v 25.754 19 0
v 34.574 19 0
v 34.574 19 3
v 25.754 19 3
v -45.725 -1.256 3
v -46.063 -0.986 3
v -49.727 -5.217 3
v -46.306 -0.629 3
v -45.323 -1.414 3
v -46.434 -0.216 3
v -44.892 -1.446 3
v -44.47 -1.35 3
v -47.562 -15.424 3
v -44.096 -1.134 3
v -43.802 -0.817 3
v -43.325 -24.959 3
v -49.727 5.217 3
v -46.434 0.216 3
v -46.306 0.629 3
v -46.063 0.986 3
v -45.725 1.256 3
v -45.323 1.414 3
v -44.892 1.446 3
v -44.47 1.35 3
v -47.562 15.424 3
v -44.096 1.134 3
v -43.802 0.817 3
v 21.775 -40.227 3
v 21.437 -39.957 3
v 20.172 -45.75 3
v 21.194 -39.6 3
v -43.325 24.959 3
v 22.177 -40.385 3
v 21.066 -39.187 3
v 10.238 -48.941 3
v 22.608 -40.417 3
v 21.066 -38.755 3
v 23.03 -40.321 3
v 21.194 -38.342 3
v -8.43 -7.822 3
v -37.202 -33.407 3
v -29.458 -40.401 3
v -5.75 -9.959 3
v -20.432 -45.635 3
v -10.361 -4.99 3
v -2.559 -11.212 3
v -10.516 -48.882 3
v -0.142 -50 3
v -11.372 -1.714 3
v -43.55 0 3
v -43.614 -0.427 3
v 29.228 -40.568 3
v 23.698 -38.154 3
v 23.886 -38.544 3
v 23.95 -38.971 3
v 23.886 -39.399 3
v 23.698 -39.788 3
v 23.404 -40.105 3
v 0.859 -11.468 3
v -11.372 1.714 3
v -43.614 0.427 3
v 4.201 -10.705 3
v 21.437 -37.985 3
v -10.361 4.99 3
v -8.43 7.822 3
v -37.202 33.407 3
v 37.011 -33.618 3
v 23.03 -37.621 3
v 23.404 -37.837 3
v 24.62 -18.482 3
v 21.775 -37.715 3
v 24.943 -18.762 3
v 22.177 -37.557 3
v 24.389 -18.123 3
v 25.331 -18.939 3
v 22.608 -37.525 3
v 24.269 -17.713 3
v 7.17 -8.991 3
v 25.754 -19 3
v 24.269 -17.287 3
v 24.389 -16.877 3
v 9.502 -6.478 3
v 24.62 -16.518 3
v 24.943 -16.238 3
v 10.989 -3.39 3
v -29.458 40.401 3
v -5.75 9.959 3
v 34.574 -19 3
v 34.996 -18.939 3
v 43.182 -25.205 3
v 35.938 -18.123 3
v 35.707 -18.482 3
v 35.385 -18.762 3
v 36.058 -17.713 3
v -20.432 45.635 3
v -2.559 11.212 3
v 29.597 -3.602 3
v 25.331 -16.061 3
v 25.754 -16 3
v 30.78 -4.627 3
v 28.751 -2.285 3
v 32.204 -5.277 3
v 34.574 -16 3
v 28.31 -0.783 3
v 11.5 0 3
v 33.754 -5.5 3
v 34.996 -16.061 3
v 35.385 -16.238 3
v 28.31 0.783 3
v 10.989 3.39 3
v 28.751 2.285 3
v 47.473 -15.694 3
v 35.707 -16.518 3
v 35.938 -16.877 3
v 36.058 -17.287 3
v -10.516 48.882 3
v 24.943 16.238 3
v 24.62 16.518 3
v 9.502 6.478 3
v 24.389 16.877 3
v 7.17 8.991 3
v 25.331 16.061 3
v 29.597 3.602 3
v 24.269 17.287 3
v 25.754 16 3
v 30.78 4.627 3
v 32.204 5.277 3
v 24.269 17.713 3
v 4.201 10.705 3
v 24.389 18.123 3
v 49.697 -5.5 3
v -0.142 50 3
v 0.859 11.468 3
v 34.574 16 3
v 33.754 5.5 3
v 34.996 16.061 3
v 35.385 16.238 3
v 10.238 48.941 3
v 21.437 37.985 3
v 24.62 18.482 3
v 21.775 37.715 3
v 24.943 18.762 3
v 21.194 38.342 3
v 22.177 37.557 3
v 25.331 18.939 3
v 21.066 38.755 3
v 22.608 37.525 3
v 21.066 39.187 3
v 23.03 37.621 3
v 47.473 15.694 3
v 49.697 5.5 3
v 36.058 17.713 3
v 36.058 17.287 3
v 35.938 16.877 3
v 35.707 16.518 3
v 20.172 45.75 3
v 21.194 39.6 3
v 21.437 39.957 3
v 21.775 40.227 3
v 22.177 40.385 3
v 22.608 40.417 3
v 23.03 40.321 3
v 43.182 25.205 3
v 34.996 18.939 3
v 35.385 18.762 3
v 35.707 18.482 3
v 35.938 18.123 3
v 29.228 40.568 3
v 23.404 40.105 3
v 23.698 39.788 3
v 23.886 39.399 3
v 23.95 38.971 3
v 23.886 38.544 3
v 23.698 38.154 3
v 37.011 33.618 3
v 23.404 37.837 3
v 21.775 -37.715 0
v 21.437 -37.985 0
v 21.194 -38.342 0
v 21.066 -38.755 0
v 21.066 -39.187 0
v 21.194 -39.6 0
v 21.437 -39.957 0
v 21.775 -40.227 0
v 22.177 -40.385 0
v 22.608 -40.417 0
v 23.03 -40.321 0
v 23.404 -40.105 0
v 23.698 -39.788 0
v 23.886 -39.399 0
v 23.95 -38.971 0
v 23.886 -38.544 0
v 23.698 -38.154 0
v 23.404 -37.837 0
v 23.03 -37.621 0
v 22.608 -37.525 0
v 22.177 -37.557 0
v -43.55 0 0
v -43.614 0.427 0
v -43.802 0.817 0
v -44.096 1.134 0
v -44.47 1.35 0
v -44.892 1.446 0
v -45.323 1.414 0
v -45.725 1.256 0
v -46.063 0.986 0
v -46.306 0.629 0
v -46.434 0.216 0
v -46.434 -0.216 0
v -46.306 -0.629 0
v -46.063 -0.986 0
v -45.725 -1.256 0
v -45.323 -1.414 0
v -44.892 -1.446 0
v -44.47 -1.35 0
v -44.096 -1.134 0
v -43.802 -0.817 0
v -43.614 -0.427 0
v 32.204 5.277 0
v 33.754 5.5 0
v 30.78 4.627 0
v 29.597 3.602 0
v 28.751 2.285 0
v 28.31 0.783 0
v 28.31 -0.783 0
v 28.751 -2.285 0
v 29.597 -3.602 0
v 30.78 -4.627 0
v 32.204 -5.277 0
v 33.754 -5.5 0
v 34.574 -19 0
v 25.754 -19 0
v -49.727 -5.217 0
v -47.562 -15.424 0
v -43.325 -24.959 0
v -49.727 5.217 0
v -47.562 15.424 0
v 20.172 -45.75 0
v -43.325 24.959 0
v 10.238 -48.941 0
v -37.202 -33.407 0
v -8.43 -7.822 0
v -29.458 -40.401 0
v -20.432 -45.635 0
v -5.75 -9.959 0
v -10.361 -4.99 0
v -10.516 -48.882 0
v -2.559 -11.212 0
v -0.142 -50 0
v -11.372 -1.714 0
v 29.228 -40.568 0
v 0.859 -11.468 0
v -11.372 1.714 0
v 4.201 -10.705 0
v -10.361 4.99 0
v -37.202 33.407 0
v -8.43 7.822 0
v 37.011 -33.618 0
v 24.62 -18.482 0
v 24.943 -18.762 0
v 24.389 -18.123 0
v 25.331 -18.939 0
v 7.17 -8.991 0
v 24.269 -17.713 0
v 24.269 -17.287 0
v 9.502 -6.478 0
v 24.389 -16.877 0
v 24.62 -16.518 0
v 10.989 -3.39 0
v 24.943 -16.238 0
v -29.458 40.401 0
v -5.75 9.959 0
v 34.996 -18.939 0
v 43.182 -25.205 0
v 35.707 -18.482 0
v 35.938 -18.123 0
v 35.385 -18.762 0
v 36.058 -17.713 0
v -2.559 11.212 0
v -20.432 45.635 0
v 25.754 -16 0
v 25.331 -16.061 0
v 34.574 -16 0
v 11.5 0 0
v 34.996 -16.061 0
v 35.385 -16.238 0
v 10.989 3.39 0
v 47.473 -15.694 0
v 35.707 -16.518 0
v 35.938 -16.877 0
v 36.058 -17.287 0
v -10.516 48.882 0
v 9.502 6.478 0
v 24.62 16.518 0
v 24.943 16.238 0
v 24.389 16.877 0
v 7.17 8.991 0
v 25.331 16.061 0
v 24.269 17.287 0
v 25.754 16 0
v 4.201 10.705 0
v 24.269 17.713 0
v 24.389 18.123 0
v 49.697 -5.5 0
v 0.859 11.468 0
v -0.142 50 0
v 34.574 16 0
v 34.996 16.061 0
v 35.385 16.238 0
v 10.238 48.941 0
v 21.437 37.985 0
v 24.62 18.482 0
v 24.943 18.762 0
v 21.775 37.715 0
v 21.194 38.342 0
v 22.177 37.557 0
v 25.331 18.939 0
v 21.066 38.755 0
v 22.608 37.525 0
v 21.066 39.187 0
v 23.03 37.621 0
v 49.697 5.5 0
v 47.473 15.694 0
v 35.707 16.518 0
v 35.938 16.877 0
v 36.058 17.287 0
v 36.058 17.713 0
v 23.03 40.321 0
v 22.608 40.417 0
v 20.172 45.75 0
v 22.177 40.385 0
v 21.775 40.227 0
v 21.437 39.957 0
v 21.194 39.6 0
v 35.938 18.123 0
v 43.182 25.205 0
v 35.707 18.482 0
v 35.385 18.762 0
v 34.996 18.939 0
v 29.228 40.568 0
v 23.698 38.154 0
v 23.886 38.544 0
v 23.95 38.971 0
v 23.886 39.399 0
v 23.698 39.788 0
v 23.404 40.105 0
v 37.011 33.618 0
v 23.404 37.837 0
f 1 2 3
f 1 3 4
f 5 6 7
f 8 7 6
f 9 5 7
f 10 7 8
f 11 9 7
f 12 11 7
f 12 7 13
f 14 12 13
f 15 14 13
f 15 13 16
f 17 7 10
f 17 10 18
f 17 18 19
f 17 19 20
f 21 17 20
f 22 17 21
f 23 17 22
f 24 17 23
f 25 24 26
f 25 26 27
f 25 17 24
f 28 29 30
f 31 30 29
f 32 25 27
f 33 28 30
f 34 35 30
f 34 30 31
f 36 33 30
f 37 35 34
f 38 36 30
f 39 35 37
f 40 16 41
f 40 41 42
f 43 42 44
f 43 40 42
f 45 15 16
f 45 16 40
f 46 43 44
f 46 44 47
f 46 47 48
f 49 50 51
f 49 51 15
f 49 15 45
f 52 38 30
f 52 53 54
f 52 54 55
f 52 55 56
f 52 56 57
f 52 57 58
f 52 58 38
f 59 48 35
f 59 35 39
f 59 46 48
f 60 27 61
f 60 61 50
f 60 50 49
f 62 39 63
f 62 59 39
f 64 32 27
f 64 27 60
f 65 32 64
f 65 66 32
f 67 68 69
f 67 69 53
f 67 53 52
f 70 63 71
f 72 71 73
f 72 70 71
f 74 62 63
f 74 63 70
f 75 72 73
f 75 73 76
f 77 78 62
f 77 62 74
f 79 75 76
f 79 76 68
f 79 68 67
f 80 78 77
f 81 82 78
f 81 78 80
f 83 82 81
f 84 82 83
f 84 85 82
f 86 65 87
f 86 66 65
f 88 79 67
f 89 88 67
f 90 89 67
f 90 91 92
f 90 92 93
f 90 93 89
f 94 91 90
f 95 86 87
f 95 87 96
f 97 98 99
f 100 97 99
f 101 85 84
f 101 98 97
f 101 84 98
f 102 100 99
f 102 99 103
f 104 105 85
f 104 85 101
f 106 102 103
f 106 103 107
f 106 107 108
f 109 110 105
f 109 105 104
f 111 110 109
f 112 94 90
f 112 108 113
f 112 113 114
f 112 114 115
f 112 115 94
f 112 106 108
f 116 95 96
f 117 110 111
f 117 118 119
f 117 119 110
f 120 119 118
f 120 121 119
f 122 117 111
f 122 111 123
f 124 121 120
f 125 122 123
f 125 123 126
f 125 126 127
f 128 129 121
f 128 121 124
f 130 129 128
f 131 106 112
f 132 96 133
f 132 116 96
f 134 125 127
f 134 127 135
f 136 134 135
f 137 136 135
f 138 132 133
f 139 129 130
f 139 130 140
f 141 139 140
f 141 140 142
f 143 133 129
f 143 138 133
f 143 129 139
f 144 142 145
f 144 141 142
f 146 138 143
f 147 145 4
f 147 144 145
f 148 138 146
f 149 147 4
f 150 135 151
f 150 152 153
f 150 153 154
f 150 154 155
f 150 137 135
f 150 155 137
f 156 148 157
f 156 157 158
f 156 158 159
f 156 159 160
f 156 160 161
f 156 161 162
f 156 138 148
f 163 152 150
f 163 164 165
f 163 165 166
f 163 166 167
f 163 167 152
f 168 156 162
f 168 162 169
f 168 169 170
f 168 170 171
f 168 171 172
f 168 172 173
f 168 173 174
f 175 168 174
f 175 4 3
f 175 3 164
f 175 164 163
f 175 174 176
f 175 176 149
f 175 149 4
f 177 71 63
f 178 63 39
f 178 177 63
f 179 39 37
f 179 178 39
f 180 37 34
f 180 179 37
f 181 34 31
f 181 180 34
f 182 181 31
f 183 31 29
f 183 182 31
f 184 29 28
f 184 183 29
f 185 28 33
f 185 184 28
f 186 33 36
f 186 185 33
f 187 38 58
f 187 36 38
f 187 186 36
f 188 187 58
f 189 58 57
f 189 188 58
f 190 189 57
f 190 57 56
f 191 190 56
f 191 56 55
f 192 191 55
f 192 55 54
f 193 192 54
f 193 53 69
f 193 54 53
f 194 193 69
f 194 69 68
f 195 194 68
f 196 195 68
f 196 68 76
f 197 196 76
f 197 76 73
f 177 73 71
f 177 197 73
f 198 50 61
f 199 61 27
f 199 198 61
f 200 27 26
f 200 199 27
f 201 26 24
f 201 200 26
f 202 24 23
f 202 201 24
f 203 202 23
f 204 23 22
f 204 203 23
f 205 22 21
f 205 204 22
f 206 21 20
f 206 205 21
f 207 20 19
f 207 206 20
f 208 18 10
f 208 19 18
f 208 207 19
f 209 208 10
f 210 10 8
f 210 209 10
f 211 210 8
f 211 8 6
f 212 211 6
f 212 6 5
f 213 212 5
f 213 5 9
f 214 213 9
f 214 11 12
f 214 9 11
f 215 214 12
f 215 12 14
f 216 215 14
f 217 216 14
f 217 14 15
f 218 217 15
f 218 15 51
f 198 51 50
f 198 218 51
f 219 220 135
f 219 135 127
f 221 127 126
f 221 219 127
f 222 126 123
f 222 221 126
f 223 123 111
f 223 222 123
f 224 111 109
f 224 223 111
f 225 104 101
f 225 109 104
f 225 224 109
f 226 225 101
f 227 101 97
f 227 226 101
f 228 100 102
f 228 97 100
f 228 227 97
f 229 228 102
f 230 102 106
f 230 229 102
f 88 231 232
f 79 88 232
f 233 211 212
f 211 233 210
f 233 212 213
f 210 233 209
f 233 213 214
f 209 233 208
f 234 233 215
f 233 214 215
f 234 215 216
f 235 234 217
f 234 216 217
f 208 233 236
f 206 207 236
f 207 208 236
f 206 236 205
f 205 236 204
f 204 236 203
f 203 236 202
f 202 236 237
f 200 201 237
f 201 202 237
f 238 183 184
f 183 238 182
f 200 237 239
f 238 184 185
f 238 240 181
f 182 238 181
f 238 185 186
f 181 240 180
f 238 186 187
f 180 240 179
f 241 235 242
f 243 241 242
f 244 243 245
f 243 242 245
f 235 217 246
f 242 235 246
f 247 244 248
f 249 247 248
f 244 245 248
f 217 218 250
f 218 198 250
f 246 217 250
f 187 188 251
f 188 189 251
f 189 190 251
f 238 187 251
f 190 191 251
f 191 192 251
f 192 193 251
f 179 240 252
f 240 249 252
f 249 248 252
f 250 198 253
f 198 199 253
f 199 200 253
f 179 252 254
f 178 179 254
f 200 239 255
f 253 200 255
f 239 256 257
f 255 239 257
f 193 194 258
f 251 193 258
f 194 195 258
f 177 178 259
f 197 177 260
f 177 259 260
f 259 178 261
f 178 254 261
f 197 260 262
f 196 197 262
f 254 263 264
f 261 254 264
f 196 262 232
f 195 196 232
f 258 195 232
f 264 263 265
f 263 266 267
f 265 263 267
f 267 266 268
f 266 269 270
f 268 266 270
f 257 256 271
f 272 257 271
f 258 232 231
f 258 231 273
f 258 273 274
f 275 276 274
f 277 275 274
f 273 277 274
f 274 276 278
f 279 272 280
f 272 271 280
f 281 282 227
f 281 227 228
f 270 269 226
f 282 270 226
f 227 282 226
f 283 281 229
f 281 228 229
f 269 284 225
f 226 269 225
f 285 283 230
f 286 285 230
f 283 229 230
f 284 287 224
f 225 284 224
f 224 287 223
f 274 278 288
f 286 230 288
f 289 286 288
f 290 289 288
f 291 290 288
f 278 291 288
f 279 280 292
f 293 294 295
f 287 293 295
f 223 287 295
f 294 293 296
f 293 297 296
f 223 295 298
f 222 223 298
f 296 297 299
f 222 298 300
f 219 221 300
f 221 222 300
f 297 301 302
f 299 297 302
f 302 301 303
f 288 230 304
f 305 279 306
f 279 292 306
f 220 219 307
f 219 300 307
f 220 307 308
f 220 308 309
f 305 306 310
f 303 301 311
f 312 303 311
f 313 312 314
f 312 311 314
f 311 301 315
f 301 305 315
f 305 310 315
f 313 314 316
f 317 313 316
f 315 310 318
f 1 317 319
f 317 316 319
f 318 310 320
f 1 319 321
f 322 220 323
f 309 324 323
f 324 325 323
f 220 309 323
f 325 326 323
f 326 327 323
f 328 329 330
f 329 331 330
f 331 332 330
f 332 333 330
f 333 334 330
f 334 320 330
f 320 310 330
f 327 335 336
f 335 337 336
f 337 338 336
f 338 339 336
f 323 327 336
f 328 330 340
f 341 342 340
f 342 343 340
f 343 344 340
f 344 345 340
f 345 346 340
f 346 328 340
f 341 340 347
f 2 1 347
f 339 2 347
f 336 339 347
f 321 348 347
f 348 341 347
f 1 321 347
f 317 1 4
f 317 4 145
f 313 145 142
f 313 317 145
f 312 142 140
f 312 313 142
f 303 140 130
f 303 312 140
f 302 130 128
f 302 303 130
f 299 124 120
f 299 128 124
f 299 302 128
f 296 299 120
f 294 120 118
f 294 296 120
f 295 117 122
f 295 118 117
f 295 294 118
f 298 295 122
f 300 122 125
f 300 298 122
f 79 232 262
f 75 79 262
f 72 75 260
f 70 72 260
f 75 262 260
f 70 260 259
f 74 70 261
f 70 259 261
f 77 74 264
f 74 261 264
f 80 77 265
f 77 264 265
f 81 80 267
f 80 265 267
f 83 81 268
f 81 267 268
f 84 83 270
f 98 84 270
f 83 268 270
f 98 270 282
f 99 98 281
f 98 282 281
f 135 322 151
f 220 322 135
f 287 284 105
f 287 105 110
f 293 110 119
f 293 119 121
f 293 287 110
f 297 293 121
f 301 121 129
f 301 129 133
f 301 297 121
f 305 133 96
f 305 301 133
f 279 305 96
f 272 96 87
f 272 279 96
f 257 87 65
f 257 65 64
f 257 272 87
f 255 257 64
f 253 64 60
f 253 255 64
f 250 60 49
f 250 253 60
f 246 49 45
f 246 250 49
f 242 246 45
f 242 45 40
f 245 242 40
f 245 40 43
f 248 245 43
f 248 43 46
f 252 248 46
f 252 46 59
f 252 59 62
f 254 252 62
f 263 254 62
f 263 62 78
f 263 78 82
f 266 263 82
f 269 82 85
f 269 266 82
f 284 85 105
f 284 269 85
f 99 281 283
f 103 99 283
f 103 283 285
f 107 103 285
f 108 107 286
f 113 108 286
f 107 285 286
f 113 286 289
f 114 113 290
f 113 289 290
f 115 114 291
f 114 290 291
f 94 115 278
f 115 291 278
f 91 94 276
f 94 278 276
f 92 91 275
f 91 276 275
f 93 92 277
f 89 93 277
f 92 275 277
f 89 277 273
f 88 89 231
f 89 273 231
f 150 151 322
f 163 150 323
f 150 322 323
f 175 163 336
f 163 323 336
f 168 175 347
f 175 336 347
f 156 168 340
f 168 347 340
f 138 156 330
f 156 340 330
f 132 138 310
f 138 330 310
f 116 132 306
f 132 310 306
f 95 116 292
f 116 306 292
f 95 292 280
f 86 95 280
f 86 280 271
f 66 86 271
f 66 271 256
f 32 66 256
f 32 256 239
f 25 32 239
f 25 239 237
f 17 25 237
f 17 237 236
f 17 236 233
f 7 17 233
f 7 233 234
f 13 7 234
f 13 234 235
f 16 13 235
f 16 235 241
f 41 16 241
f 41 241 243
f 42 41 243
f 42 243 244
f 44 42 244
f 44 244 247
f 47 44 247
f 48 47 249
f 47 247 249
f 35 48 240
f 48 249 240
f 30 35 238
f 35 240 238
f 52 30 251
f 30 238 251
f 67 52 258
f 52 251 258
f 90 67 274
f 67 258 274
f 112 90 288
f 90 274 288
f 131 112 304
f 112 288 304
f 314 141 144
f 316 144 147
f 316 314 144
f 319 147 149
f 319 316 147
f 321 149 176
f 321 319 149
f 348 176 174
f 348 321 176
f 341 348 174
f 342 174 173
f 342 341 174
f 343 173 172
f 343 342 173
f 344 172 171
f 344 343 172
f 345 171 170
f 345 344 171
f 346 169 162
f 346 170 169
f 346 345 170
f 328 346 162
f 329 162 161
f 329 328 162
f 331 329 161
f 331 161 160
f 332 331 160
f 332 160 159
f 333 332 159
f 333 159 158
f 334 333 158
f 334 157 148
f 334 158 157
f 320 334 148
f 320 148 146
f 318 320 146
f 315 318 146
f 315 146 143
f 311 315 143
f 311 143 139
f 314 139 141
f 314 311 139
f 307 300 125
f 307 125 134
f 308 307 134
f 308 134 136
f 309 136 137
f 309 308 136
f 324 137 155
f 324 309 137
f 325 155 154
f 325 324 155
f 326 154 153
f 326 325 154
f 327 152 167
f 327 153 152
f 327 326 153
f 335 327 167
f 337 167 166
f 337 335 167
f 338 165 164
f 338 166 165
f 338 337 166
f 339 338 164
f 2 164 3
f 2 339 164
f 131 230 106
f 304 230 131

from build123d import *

# Parameters (mm, degrees)
ESQUISSE1_R                  = 50
ESQUISSE1_R_2                = 11.5
BOSS_EXTRU_1_DEPTH           = 3
ENL_V_MAT_EXTRU_2_DEPTH      = 4
ESQUISSE4_R                  = 1.45
ENL_V_MAT_EXTRU_3_DEPTH      = 71.774289117
R_P_TITION_CIRCULAIRE1_COUNT = 3


with BuildPart() as part:
    # Esquisse1 → Boss.-Extru.1 (new body)
    with BuildSketch(Plane.XY):
        Circle(ESQUISSE1_R)
        Circle(ESQUISSE1_R_2, mode=Mode.SUBTRACT)
    extrude(amount=BOSS_EXTRU_1_DEPTH)

    # Esquisse3 → Enlèv. mat.-Extru.2 (cut)
    with BuildSketch(Plane(origin=(0, 0, 0), x_dir=(-1, 0, 0), z_dir=(0, 0, -1))):
        with BuildLine():
            Line((-50.492676186, 5.5), (-33.753889757, 5.5))
            ThreePointArc((-33.753889757, 5.5), (-28.253889757, 0), (-33.753889757, -5.5))
            Line((-33.753889757, -5.5), (-50.492676186, -5.5))
            ThreePointArc((-50.492676186, -5.5), (-55.992676186, 0), (-50.492676186, 5.5))
        make_face()
        with BuildLine():
            Line((-34.573554166, 19), (-25.753889757, 19))
            ThreePointArc((-25.753889757, 19), (-24.253889757, 17.5), (-25.753889757, 16))
            Line((-25.753889757, 16), (-34.573554166, 16))
            ThreePointArc((-34.573554166, 16), (-36.073554166, 17.5), (-34.573554166, 19))
        make_face()
        with BuildLine():
            Line((-34.573554166, -19), (-25.753889757, -19))
            ThreePointArc((-25.753889757, -19), (-24.253889757, -17.5), (-25.753889757, -16))
            Line((-25.753889757, -16), (-34.573554166, -16))
            ThreePointArc((-34.573554166, -16), (-36.073554166, -17.5), (-34.573554166, -19))
        make_face()
    extrude(amount=-ENL_V_MAT_EXTRU_2_DEPTH, mode=Mode.SUBTRACT)

    # Esquisse4 → Enlèv. mat.-Extru.3 (cut, through all)
    with BuildSketch(Plane.XY):
        with Locations((-45, 0)):
            Circle(ESQUISSE4_R)
    enl_v_mat_extru_3 = extrude(amount=ENL_V_MAT_EXTRU_3_DEPTH, mode=Mode.SUBTRACT)

    # Répétition circulaire1: Enlèv. mat.-Extru.3 ×3 about axis
    r_p_tition_circulaire1_axis = Axis((0, 0, 3), (0, 0, -1))
    for i in range(1, R_P_TITION_CIRCULAIRE1_COUNT):
        add(enl_v_mat_extru_3.rotate(r_p_tition_circulaire1_axis, i * 360 / R_P_TITION_CIRCULAIRE1_COUNT), mode=Mode.SUBTRACT)


solid = part.part
